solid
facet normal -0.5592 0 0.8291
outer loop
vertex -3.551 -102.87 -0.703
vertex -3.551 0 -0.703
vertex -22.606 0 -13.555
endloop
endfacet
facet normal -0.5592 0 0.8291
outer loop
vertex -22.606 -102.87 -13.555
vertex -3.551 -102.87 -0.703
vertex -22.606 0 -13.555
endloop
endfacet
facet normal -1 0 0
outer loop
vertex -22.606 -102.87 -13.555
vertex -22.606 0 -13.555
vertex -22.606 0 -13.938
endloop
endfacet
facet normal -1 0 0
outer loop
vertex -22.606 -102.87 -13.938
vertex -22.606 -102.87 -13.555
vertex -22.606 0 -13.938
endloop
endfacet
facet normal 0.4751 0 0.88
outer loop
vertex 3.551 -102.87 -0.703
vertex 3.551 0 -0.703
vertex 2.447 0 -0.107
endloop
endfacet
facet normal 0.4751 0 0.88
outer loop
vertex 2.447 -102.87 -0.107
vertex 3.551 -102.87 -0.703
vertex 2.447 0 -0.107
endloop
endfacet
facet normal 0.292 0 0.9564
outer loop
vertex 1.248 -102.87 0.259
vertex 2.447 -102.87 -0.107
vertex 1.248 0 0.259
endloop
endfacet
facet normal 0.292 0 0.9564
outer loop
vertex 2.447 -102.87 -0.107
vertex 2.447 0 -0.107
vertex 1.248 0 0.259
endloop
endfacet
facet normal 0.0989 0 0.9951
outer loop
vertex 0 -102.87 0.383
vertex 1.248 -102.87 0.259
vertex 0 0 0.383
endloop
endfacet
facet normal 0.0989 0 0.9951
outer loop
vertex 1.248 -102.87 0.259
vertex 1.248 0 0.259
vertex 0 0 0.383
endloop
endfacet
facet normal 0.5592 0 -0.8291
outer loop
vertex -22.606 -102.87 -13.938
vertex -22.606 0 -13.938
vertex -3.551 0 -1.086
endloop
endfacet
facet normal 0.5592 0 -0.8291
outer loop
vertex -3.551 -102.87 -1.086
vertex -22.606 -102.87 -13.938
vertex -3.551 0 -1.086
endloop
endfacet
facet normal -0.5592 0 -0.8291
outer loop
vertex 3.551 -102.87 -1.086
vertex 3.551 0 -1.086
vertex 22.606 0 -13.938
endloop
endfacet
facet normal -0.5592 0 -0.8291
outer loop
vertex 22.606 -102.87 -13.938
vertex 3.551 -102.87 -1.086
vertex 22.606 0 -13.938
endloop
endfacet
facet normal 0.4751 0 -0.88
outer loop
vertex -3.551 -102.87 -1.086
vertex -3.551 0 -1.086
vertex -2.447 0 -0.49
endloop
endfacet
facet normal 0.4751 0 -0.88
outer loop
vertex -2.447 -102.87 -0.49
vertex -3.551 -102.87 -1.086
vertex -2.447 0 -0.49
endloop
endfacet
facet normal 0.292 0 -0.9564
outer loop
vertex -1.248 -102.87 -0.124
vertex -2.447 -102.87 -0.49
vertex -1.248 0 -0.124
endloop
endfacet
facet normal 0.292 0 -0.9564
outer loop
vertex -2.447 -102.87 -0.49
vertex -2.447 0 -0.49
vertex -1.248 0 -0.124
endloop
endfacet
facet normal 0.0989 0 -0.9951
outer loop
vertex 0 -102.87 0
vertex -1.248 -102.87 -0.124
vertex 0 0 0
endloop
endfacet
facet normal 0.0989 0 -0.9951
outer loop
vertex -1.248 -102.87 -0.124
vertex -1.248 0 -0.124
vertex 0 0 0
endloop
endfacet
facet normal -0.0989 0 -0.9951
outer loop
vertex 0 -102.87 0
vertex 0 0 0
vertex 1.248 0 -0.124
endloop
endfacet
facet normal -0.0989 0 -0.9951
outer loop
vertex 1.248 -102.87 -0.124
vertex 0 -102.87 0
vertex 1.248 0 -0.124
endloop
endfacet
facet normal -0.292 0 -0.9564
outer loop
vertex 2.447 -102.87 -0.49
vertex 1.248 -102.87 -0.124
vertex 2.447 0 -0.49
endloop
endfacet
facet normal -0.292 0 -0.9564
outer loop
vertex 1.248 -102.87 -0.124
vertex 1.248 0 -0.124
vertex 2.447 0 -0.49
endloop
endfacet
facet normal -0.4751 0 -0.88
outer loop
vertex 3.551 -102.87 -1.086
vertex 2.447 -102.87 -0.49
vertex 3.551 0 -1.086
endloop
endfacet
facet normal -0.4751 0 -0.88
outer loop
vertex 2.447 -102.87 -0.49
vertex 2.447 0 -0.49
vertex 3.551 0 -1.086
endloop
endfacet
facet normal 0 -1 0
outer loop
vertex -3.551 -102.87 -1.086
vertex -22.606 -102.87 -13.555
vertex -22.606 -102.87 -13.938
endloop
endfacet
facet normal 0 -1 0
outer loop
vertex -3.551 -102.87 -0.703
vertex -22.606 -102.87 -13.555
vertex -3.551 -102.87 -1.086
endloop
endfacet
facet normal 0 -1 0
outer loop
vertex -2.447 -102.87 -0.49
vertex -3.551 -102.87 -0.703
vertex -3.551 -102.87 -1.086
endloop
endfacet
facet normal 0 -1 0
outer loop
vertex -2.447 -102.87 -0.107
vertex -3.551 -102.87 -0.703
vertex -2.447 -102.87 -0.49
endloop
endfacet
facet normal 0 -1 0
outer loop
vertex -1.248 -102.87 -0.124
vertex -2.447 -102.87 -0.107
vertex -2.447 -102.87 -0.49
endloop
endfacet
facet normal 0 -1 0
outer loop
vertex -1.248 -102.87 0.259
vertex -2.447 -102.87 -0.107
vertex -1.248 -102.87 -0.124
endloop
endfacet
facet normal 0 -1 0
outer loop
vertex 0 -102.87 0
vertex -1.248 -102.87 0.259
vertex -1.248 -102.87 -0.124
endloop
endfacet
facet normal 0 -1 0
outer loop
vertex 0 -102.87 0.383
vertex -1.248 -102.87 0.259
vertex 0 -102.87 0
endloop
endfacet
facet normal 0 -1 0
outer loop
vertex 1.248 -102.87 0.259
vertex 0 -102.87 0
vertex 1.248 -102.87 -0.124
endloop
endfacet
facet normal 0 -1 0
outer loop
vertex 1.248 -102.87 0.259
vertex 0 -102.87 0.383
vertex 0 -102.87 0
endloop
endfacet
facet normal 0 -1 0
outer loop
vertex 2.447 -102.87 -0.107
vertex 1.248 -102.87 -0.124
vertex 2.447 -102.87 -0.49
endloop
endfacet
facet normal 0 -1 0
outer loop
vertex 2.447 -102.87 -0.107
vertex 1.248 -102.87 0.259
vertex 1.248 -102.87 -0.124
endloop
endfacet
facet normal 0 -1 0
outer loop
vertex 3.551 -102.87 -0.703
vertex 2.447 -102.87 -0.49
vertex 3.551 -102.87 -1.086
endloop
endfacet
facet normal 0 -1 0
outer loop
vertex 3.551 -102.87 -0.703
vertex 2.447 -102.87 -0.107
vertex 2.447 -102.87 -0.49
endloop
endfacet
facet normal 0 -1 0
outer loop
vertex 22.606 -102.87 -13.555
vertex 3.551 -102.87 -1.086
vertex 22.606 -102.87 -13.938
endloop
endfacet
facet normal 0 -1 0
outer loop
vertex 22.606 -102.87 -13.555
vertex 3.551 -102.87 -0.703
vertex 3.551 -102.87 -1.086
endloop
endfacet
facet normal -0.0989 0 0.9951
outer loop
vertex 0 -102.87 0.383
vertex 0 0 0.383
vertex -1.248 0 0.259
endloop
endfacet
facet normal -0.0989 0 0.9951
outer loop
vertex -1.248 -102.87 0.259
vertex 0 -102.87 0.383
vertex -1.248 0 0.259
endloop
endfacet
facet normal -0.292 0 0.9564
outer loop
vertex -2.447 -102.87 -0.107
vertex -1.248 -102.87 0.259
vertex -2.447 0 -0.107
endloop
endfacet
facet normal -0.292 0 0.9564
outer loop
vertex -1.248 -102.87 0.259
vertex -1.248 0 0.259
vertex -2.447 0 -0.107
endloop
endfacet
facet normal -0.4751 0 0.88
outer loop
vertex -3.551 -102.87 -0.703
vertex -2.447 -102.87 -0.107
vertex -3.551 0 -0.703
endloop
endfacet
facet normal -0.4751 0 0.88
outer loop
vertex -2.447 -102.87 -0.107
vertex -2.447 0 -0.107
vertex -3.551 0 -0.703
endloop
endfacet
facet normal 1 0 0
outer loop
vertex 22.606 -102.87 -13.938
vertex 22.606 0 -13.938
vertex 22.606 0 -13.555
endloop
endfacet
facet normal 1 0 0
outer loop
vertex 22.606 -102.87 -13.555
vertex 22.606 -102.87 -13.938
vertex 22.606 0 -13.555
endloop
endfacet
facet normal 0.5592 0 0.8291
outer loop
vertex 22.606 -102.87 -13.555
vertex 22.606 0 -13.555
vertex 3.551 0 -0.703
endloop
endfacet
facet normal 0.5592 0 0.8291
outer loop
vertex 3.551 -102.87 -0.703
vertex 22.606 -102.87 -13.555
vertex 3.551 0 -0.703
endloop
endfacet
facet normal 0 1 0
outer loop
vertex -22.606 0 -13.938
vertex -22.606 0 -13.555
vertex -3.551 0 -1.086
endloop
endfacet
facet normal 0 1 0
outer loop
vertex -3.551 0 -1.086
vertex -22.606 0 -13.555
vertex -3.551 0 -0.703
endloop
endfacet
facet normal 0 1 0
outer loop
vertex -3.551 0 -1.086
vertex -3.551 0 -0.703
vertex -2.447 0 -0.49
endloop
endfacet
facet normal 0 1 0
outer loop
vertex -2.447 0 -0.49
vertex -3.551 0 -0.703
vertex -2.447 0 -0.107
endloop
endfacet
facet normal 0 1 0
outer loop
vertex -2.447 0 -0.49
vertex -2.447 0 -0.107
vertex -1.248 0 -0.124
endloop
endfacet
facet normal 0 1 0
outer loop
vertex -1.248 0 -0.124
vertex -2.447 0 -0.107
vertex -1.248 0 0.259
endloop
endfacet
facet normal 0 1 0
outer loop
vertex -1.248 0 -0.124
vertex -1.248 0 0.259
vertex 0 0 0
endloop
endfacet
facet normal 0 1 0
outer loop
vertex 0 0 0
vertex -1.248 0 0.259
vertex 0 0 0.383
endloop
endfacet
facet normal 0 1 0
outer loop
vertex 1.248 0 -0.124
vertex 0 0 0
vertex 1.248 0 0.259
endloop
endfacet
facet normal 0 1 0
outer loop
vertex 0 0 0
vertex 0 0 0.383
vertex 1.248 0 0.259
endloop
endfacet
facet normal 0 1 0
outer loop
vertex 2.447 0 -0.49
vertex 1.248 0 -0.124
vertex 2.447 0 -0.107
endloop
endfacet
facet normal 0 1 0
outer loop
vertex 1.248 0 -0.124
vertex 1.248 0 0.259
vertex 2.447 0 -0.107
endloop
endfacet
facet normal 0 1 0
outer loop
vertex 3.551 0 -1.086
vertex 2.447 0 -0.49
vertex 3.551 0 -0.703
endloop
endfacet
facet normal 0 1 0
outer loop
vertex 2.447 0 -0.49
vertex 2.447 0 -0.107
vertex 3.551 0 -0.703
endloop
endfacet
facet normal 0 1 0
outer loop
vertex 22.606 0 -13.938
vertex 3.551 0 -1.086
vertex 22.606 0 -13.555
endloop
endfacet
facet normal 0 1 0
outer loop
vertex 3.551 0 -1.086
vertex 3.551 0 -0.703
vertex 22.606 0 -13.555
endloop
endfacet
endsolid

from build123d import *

# Parameters (mm, degrees)
F1_DEPTH = 102.87


with BuildPart() as f1:
    # F0 (on Front) → F1 (new body)
    with BuildSketch(Plane.XZ):
        with BuildLine():
            Line((22.606, -13.555481), (3.550875, -0.702637))
            ThreePointArc((3.550875, -0.702637), (1.85656, 0.105509), (0, 0.382974))
            ThreePointArc((0, 0.382974), (-1.85656, 0.105509), (-3.550875, -0.702637))
            Line((-3.550875, -0.702637), (-22.606, -13.555481))
            Line((-22.606, -13.555481), (-22.606, -13.938456))
            Line((-22.606, -13.938456), (-3.550875, -1.085611))
            ThreePointArc((-3.550875, -1.085611), (-1.85656, -0.277465), (0, 0))
            ThreePointArc((0, 0), (1.85656, -0.277465), (3.550875, -1.085611))
            Line((3.550875, -1.085611), (22.606, -13.938456))
            Line((22.606, -13.938456), (22.606, -13.555481))
        make_face()
    extrude(amount=F1_DEPTH)


solid = f1.part
